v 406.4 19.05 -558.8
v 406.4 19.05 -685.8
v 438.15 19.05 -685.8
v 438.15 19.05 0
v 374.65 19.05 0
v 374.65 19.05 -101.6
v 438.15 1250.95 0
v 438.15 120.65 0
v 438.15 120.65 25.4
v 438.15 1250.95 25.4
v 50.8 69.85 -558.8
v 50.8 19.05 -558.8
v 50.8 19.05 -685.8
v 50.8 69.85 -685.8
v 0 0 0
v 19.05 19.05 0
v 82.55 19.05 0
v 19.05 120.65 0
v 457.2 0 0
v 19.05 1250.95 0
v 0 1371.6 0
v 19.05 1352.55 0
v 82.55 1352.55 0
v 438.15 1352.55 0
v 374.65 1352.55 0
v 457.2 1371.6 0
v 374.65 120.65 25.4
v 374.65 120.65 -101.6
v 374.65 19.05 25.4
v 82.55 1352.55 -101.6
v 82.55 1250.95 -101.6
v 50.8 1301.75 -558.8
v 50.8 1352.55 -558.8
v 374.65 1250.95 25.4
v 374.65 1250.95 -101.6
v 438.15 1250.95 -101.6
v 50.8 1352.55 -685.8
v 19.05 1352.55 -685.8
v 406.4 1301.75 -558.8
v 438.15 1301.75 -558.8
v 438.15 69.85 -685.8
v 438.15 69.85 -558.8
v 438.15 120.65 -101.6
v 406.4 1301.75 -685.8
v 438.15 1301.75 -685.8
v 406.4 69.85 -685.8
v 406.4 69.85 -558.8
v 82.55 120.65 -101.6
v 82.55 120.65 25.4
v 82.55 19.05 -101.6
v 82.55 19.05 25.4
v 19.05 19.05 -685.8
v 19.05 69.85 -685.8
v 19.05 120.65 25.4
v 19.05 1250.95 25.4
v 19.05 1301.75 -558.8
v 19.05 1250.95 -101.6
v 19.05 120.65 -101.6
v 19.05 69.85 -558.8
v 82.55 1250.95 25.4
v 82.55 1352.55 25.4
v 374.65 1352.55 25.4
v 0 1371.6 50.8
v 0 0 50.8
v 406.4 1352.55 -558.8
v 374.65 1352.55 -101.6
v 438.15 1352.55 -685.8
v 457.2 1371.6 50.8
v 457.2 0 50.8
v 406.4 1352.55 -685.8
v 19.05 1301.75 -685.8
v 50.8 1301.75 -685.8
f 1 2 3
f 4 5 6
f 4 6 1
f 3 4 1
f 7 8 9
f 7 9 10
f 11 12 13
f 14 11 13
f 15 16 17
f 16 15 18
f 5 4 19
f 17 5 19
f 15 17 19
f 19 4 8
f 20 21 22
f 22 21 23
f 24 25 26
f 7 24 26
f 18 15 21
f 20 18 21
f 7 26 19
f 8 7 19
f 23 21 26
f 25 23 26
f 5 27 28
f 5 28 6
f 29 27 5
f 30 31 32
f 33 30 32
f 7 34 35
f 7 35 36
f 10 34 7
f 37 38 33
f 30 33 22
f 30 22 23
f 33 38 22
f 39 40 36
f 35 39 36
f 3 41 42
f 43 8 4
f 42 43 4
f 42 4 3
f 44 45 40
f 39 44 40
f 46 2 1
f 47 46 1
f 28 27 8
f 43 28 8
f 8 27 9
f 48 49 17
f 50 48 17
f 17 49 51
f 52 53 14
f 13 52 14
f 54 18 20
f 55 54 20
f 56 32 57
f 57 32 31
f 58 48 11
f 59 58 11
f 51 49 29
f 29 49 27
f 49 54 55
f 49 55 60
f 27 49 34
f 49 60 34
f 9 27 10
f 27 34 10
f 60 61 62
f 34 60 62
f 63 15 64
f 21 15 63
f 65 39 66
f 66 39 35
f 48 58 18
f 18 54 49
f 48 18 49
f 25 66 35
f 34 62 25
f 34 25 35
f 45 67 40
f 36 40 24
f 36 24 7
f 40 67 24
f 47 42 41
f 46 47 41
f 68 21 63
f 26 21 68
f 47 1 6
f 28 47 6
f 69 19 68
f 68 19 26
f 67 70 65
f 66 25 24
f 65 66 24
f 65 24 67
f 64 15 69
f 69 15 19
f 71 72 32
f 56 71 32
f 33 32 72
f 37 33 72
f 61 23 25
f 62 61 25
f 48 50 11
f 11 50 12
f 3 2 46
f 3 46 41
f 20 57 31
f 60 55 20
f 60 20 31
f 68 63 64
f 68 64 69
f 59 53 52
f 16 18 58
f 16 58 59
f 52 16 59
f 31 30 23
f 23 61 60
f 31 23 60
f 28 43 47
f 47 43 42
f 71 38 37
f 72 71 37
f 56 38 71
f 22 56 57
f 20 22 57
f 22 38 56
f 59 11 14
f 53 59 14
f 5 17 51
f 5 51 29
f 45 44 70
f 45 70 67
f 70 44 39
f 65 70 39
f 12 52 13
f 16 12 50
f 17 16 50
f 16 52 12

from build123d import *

# Parameters (mm, degrees)
F0_W     = 457.2
F0_H     = 1371.6
F0_W_2   = 419.1
F0_H_2   = 1333.5
F1_DEPTH = 25.4
F2_W     = 457.2
F2_H     = 1371.6
F3_DEPTH = 25.4
F4_W     = 63.5
F4_H     = 101.6
F5_DEPTH = 711.2
F7_DEPTH = 1352.551
F9_DEPTH = 438.151


with BuildPart() as f1:
    # F0 (on Top) → F1 (new body)
    with BuildSketch(Plane.XY):
        with Locations((228.6, 685.8)):
            Rectangle(F0_W, F0_H)
        with Locations((228.6, 685.8)):
            Rectangle(F0_W_2, F0_H_2, mode=Mode.SUBTRACT)
    extrude(amount=F1_DEPTH)

    # F2 (on face) → F3 (join)
    with BuildSketch(Plane.XY.offset(25.4)):
        with Locations((228.6, 685.8)):
            Rectangle(F2_W, F2_H)
    extrude(amount=F3_DEPTH)

    # F4 (on face) → F5 (join)
    with BuildSketch(Plane(origin=(0, 0, 25.4), x_dir=(1, 0, 0), z_dir=(0, 0, -1))):
        with Locations((50.8, -69.85)):
            Rectangle(F4_W, F4_H)
        with Locations((406.4, -69.85)):
            Rectangle(F4_W, F4_H)
        with Locations((50.8, -1301.75)):
            Rectangle(F4_W, F4_H)
        with Locations((406.4, -1301.75)):
            Rectangle(F4_W, F4_H)
    extrude(amount=F5_DEPTH)

    # F6 (on face) → F7 (cut, through all)
    with BuildSketch(Plane.XZ.offset(-19.05)):
        Polygon((50.8, -558.8), (50.8, -685.8), (406.4, -685.8), (406.4, -558.8), (374.65, -101.6), (82.55, -101.6), align=None)
    extrude(amount=-F7_DEPTH, mode=Mode.SUBTRACT)

    # F8 (on face) → F9 (cut, through all)
    with BuildSketch(Plane.YZ.offset(438.15)):
        Polygon((69.85, -558.8), (69.85, -685.8), (1301.75, -685.8), (1301.75, -558.8), (1250.95, -101.6), (120.65, -101.6), align=None)
    extrude(amount=-F9_DEPTH, mode=Mode.SUBTRACT)


solid = f1.part
